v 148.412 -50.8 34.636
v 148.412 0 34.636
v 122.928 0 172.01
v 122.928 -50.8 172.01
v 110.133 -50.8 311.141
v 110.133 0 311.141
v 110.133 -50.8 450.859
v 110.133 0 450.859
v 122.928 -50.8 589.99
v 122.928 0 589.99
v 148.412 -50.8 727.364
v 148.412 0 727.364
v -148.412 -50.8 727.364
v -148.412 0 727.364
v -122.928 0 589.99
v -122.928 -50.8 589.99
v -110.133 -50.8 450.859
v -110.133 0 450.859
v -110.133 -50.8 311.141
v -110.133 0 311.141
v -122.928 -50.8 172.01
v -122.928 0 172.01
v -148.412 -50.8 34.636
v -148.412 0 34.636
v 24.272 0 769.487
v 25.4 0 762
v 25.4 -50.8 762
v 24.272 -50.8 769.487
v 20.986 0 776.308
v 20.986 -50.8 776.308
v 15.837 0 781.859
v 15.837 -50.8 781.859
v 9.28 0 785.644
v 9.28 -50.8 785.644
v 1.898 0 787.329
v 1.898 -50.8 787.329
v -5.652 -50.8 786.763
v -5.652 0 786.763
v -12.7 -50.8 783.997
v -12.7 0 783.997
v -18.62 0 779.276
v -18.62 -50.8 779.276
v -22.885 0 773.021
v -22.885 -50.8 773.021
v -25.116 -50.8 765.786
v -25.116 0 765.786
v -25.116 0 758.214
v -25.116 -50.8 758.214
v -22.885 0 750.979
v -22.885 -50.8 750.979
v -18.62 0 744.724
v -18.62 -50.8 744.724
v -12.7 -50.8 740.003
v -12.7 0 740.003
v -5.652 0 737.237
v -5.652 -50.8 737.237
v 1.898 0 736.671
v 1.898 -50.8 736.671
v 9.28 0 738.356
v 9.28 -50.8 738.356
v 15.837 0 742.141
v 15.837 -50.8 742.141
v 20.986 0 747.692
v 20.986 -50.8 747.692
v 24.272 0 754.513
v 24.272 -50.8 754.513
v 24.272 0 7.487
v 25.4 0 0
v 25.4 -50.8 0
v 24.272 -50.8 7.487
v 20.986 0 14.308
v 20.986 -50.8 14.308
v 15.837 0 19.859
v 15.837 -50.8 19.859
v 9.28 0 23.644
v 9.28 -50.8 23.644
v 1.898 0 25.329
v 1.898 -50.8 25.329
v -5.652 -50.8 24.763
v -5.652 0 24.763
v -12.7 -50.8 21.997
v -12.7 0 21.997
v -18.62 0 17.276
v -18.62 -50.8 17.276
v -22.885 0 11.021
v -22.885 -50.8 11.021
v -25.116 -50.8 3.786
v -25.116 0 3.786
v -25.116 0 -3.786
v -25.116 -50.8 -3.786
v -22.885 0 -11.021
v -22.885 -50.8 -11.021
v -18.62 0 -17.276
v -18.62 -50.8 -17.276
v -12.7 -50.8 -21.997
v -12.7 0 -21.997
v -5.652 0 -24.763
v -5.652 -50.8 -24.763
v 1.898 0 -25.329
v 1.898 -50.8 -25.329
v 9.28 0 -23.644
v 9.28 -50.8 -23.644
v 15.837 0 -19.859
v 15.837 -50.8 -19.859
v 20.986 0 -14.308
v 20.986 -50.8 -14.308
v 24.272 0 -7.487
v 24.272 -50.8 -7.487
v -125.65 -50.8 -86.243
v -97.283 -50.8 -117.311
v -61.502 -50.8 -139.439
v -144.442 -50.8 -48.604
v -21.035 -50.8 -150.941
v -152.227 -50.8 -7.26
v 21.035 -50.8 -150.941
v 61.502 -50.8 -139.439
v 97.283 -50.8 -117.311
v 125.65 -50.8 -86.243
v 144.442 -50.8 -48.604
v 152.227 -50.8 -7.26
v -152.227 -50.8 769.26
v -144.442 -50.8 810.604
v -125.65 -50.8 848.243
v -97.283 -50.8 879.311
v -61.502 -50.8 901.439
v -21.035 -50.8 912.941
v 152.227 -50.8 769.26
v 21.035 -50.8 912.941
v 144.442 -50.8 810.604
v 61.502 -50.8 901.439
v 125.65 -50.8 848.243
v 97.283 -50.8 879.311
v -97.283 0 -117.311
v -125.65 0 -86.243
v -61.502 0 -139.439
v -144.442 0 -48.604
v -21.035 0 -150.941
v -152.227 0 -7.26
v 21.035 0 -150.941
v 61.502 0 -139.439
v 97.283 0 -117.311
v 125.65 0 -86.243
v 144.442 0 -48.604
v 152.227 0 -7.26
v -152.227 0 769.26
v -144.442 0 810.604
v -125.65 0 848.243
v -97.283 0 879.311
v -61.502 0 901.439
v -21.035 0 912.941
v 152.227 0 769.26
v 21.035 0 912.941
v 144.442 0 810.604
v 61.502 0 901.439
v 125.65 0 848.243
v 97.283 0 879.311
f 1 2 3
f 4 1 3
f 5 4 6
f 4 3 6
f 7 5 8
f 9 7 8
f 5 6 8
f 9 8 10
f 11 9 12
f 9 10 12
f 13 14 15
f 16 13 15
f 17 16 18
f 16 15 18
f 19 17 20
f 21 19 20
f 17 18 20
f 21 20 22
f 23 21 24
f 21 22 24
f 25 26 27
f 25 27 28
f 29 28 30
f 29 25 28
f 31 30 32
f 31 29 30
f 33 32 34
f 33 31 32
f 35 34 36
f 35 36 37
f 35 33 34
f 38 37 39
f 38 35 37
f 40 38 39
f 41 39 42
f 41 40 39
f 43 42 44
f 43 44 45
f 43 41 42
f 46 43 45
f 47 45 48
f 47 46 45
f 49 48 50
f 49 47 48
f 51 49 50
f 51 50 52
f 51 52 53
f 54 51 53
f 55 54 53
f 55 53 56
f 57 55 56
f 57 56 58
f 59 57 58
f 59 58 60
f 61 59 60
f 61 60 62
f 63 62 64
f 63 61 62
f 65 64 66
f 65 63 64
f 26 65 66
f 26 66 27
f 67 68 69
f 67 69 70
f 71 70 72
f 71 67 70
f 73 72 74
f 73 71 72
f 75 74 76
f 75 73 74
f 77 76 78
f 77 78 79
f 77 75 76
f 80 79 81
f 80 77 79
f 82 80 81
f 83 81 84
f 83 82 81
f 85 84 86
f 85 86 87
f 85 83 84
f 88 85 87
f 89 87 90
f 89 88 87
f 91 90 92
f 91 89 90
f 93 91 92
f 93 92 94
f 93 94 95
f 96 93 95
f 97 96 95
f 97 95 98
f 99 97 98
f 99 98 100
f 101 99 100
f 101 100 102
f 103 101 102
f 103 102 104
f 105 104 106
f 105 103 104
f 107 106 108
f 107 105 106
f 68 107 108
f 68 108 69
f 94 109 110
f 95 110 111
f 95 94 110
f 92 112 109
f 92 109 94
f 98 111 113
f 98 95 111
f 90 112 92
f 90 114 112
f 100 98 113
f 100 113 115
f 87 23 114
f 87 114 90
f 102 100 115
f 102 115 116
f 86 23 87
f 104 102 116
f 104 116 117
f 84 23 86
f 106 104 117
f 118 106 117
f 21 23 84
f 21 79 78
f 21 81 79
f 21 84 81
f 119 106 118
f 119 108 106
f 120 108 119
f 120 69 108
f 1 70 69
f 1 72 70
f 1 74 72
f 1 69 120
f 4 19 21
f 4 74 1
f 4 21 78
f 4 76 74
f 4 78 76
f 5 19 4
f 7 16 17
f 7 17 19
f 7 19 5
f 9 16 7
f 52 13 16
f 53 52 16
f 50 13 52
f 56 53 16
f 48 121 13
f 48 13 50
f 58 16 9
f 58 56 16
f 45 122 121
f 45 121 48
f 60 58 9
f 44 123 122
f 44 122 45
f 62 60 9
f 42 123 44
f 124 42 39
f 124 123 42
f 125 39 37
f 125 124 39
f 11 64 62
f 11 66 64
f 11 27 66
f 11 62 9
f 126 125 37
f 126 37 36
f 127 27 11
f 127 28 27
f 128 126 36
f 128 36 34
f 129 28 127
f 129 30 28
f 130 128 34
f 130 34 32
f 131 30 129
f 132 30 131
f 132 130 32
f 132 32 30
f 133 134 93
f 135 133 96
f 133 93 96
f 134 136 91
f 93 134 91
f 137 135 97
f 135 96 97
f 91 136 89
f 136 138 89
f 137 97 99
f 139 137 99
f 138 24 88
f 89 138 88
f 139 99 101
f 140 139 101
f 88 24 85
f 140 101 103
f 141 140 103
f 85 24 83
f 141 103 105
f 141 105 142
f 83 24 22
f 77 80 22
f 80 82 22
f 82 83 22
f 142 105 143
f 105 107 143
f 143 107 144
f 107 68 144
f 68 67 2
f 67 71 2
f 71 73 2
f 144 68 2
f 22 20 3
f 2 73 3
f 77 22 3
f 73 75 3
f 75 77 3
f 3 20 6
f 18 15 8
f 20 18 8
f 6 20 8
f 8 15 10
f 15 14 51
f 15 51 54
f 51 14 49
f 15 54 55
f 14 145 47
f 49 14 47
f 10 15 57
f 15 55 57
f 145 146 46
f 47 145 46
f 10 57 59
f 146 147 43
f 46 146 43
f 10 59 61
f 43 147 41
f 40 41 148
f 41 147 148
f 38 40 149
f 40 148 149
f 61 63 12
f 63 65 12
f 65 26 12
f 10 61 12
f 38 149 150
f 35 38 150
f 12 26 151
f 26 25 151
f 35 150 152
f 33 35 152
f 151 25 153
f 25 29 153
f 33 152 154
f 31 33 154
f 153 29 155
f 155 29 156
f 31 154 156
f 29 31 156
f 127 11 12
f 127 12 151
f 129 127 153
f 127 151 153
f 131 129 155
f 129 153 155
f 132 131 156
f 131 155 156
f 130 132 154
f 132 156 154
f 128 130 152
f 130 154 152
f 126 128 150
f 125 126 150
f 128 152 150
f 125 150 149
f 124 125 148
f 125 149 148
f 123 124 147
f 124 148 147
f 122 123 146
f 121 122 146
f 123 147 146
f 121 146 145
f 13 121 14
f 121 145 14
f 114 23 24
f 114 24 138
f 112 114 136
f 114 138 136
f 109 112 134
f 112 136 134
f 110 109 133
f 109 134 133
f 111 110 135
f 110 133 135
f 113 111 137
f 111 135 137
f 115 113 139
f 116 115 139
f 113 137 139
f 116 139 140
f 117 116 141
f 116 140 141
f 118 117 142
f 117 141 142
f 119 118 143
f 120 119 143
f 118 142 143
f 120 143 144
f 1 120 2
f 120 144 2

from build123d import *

# Parameters (mm, degrees)
F0_R     = 25.4
F1_DEPTH = 50.8


with BuildPart() as f1:
    # F0 (on Front) → F1 (new body)
    with BuildSketch(Plane.XZ):
        with BuildLine():
            ThreePointArc((-148.411867, 727.363636), (-108.530539, 381), (-148.411867, 34.636364))
            ThreePointArc((-148.411867, 34.636364), (0, -152.4), (148.411867, 34.636364))
            ThreePointArc((148.411867, 34.636364), (108.530539, 381), (148.411867, 727.363636))
            ThreePointArc((148.411867, 727.363636), (0, 914.4), (-148.411867, 727.363636))
        make_face()
        Circle(F0_R, mode=Mode.SUBTRACT)
        with Locations((0, 762)):
            Circle(F0_R, mode=Mode.SUBTRACT)
    extrude(amount=F1_DEPTH)


solid = f1.part
